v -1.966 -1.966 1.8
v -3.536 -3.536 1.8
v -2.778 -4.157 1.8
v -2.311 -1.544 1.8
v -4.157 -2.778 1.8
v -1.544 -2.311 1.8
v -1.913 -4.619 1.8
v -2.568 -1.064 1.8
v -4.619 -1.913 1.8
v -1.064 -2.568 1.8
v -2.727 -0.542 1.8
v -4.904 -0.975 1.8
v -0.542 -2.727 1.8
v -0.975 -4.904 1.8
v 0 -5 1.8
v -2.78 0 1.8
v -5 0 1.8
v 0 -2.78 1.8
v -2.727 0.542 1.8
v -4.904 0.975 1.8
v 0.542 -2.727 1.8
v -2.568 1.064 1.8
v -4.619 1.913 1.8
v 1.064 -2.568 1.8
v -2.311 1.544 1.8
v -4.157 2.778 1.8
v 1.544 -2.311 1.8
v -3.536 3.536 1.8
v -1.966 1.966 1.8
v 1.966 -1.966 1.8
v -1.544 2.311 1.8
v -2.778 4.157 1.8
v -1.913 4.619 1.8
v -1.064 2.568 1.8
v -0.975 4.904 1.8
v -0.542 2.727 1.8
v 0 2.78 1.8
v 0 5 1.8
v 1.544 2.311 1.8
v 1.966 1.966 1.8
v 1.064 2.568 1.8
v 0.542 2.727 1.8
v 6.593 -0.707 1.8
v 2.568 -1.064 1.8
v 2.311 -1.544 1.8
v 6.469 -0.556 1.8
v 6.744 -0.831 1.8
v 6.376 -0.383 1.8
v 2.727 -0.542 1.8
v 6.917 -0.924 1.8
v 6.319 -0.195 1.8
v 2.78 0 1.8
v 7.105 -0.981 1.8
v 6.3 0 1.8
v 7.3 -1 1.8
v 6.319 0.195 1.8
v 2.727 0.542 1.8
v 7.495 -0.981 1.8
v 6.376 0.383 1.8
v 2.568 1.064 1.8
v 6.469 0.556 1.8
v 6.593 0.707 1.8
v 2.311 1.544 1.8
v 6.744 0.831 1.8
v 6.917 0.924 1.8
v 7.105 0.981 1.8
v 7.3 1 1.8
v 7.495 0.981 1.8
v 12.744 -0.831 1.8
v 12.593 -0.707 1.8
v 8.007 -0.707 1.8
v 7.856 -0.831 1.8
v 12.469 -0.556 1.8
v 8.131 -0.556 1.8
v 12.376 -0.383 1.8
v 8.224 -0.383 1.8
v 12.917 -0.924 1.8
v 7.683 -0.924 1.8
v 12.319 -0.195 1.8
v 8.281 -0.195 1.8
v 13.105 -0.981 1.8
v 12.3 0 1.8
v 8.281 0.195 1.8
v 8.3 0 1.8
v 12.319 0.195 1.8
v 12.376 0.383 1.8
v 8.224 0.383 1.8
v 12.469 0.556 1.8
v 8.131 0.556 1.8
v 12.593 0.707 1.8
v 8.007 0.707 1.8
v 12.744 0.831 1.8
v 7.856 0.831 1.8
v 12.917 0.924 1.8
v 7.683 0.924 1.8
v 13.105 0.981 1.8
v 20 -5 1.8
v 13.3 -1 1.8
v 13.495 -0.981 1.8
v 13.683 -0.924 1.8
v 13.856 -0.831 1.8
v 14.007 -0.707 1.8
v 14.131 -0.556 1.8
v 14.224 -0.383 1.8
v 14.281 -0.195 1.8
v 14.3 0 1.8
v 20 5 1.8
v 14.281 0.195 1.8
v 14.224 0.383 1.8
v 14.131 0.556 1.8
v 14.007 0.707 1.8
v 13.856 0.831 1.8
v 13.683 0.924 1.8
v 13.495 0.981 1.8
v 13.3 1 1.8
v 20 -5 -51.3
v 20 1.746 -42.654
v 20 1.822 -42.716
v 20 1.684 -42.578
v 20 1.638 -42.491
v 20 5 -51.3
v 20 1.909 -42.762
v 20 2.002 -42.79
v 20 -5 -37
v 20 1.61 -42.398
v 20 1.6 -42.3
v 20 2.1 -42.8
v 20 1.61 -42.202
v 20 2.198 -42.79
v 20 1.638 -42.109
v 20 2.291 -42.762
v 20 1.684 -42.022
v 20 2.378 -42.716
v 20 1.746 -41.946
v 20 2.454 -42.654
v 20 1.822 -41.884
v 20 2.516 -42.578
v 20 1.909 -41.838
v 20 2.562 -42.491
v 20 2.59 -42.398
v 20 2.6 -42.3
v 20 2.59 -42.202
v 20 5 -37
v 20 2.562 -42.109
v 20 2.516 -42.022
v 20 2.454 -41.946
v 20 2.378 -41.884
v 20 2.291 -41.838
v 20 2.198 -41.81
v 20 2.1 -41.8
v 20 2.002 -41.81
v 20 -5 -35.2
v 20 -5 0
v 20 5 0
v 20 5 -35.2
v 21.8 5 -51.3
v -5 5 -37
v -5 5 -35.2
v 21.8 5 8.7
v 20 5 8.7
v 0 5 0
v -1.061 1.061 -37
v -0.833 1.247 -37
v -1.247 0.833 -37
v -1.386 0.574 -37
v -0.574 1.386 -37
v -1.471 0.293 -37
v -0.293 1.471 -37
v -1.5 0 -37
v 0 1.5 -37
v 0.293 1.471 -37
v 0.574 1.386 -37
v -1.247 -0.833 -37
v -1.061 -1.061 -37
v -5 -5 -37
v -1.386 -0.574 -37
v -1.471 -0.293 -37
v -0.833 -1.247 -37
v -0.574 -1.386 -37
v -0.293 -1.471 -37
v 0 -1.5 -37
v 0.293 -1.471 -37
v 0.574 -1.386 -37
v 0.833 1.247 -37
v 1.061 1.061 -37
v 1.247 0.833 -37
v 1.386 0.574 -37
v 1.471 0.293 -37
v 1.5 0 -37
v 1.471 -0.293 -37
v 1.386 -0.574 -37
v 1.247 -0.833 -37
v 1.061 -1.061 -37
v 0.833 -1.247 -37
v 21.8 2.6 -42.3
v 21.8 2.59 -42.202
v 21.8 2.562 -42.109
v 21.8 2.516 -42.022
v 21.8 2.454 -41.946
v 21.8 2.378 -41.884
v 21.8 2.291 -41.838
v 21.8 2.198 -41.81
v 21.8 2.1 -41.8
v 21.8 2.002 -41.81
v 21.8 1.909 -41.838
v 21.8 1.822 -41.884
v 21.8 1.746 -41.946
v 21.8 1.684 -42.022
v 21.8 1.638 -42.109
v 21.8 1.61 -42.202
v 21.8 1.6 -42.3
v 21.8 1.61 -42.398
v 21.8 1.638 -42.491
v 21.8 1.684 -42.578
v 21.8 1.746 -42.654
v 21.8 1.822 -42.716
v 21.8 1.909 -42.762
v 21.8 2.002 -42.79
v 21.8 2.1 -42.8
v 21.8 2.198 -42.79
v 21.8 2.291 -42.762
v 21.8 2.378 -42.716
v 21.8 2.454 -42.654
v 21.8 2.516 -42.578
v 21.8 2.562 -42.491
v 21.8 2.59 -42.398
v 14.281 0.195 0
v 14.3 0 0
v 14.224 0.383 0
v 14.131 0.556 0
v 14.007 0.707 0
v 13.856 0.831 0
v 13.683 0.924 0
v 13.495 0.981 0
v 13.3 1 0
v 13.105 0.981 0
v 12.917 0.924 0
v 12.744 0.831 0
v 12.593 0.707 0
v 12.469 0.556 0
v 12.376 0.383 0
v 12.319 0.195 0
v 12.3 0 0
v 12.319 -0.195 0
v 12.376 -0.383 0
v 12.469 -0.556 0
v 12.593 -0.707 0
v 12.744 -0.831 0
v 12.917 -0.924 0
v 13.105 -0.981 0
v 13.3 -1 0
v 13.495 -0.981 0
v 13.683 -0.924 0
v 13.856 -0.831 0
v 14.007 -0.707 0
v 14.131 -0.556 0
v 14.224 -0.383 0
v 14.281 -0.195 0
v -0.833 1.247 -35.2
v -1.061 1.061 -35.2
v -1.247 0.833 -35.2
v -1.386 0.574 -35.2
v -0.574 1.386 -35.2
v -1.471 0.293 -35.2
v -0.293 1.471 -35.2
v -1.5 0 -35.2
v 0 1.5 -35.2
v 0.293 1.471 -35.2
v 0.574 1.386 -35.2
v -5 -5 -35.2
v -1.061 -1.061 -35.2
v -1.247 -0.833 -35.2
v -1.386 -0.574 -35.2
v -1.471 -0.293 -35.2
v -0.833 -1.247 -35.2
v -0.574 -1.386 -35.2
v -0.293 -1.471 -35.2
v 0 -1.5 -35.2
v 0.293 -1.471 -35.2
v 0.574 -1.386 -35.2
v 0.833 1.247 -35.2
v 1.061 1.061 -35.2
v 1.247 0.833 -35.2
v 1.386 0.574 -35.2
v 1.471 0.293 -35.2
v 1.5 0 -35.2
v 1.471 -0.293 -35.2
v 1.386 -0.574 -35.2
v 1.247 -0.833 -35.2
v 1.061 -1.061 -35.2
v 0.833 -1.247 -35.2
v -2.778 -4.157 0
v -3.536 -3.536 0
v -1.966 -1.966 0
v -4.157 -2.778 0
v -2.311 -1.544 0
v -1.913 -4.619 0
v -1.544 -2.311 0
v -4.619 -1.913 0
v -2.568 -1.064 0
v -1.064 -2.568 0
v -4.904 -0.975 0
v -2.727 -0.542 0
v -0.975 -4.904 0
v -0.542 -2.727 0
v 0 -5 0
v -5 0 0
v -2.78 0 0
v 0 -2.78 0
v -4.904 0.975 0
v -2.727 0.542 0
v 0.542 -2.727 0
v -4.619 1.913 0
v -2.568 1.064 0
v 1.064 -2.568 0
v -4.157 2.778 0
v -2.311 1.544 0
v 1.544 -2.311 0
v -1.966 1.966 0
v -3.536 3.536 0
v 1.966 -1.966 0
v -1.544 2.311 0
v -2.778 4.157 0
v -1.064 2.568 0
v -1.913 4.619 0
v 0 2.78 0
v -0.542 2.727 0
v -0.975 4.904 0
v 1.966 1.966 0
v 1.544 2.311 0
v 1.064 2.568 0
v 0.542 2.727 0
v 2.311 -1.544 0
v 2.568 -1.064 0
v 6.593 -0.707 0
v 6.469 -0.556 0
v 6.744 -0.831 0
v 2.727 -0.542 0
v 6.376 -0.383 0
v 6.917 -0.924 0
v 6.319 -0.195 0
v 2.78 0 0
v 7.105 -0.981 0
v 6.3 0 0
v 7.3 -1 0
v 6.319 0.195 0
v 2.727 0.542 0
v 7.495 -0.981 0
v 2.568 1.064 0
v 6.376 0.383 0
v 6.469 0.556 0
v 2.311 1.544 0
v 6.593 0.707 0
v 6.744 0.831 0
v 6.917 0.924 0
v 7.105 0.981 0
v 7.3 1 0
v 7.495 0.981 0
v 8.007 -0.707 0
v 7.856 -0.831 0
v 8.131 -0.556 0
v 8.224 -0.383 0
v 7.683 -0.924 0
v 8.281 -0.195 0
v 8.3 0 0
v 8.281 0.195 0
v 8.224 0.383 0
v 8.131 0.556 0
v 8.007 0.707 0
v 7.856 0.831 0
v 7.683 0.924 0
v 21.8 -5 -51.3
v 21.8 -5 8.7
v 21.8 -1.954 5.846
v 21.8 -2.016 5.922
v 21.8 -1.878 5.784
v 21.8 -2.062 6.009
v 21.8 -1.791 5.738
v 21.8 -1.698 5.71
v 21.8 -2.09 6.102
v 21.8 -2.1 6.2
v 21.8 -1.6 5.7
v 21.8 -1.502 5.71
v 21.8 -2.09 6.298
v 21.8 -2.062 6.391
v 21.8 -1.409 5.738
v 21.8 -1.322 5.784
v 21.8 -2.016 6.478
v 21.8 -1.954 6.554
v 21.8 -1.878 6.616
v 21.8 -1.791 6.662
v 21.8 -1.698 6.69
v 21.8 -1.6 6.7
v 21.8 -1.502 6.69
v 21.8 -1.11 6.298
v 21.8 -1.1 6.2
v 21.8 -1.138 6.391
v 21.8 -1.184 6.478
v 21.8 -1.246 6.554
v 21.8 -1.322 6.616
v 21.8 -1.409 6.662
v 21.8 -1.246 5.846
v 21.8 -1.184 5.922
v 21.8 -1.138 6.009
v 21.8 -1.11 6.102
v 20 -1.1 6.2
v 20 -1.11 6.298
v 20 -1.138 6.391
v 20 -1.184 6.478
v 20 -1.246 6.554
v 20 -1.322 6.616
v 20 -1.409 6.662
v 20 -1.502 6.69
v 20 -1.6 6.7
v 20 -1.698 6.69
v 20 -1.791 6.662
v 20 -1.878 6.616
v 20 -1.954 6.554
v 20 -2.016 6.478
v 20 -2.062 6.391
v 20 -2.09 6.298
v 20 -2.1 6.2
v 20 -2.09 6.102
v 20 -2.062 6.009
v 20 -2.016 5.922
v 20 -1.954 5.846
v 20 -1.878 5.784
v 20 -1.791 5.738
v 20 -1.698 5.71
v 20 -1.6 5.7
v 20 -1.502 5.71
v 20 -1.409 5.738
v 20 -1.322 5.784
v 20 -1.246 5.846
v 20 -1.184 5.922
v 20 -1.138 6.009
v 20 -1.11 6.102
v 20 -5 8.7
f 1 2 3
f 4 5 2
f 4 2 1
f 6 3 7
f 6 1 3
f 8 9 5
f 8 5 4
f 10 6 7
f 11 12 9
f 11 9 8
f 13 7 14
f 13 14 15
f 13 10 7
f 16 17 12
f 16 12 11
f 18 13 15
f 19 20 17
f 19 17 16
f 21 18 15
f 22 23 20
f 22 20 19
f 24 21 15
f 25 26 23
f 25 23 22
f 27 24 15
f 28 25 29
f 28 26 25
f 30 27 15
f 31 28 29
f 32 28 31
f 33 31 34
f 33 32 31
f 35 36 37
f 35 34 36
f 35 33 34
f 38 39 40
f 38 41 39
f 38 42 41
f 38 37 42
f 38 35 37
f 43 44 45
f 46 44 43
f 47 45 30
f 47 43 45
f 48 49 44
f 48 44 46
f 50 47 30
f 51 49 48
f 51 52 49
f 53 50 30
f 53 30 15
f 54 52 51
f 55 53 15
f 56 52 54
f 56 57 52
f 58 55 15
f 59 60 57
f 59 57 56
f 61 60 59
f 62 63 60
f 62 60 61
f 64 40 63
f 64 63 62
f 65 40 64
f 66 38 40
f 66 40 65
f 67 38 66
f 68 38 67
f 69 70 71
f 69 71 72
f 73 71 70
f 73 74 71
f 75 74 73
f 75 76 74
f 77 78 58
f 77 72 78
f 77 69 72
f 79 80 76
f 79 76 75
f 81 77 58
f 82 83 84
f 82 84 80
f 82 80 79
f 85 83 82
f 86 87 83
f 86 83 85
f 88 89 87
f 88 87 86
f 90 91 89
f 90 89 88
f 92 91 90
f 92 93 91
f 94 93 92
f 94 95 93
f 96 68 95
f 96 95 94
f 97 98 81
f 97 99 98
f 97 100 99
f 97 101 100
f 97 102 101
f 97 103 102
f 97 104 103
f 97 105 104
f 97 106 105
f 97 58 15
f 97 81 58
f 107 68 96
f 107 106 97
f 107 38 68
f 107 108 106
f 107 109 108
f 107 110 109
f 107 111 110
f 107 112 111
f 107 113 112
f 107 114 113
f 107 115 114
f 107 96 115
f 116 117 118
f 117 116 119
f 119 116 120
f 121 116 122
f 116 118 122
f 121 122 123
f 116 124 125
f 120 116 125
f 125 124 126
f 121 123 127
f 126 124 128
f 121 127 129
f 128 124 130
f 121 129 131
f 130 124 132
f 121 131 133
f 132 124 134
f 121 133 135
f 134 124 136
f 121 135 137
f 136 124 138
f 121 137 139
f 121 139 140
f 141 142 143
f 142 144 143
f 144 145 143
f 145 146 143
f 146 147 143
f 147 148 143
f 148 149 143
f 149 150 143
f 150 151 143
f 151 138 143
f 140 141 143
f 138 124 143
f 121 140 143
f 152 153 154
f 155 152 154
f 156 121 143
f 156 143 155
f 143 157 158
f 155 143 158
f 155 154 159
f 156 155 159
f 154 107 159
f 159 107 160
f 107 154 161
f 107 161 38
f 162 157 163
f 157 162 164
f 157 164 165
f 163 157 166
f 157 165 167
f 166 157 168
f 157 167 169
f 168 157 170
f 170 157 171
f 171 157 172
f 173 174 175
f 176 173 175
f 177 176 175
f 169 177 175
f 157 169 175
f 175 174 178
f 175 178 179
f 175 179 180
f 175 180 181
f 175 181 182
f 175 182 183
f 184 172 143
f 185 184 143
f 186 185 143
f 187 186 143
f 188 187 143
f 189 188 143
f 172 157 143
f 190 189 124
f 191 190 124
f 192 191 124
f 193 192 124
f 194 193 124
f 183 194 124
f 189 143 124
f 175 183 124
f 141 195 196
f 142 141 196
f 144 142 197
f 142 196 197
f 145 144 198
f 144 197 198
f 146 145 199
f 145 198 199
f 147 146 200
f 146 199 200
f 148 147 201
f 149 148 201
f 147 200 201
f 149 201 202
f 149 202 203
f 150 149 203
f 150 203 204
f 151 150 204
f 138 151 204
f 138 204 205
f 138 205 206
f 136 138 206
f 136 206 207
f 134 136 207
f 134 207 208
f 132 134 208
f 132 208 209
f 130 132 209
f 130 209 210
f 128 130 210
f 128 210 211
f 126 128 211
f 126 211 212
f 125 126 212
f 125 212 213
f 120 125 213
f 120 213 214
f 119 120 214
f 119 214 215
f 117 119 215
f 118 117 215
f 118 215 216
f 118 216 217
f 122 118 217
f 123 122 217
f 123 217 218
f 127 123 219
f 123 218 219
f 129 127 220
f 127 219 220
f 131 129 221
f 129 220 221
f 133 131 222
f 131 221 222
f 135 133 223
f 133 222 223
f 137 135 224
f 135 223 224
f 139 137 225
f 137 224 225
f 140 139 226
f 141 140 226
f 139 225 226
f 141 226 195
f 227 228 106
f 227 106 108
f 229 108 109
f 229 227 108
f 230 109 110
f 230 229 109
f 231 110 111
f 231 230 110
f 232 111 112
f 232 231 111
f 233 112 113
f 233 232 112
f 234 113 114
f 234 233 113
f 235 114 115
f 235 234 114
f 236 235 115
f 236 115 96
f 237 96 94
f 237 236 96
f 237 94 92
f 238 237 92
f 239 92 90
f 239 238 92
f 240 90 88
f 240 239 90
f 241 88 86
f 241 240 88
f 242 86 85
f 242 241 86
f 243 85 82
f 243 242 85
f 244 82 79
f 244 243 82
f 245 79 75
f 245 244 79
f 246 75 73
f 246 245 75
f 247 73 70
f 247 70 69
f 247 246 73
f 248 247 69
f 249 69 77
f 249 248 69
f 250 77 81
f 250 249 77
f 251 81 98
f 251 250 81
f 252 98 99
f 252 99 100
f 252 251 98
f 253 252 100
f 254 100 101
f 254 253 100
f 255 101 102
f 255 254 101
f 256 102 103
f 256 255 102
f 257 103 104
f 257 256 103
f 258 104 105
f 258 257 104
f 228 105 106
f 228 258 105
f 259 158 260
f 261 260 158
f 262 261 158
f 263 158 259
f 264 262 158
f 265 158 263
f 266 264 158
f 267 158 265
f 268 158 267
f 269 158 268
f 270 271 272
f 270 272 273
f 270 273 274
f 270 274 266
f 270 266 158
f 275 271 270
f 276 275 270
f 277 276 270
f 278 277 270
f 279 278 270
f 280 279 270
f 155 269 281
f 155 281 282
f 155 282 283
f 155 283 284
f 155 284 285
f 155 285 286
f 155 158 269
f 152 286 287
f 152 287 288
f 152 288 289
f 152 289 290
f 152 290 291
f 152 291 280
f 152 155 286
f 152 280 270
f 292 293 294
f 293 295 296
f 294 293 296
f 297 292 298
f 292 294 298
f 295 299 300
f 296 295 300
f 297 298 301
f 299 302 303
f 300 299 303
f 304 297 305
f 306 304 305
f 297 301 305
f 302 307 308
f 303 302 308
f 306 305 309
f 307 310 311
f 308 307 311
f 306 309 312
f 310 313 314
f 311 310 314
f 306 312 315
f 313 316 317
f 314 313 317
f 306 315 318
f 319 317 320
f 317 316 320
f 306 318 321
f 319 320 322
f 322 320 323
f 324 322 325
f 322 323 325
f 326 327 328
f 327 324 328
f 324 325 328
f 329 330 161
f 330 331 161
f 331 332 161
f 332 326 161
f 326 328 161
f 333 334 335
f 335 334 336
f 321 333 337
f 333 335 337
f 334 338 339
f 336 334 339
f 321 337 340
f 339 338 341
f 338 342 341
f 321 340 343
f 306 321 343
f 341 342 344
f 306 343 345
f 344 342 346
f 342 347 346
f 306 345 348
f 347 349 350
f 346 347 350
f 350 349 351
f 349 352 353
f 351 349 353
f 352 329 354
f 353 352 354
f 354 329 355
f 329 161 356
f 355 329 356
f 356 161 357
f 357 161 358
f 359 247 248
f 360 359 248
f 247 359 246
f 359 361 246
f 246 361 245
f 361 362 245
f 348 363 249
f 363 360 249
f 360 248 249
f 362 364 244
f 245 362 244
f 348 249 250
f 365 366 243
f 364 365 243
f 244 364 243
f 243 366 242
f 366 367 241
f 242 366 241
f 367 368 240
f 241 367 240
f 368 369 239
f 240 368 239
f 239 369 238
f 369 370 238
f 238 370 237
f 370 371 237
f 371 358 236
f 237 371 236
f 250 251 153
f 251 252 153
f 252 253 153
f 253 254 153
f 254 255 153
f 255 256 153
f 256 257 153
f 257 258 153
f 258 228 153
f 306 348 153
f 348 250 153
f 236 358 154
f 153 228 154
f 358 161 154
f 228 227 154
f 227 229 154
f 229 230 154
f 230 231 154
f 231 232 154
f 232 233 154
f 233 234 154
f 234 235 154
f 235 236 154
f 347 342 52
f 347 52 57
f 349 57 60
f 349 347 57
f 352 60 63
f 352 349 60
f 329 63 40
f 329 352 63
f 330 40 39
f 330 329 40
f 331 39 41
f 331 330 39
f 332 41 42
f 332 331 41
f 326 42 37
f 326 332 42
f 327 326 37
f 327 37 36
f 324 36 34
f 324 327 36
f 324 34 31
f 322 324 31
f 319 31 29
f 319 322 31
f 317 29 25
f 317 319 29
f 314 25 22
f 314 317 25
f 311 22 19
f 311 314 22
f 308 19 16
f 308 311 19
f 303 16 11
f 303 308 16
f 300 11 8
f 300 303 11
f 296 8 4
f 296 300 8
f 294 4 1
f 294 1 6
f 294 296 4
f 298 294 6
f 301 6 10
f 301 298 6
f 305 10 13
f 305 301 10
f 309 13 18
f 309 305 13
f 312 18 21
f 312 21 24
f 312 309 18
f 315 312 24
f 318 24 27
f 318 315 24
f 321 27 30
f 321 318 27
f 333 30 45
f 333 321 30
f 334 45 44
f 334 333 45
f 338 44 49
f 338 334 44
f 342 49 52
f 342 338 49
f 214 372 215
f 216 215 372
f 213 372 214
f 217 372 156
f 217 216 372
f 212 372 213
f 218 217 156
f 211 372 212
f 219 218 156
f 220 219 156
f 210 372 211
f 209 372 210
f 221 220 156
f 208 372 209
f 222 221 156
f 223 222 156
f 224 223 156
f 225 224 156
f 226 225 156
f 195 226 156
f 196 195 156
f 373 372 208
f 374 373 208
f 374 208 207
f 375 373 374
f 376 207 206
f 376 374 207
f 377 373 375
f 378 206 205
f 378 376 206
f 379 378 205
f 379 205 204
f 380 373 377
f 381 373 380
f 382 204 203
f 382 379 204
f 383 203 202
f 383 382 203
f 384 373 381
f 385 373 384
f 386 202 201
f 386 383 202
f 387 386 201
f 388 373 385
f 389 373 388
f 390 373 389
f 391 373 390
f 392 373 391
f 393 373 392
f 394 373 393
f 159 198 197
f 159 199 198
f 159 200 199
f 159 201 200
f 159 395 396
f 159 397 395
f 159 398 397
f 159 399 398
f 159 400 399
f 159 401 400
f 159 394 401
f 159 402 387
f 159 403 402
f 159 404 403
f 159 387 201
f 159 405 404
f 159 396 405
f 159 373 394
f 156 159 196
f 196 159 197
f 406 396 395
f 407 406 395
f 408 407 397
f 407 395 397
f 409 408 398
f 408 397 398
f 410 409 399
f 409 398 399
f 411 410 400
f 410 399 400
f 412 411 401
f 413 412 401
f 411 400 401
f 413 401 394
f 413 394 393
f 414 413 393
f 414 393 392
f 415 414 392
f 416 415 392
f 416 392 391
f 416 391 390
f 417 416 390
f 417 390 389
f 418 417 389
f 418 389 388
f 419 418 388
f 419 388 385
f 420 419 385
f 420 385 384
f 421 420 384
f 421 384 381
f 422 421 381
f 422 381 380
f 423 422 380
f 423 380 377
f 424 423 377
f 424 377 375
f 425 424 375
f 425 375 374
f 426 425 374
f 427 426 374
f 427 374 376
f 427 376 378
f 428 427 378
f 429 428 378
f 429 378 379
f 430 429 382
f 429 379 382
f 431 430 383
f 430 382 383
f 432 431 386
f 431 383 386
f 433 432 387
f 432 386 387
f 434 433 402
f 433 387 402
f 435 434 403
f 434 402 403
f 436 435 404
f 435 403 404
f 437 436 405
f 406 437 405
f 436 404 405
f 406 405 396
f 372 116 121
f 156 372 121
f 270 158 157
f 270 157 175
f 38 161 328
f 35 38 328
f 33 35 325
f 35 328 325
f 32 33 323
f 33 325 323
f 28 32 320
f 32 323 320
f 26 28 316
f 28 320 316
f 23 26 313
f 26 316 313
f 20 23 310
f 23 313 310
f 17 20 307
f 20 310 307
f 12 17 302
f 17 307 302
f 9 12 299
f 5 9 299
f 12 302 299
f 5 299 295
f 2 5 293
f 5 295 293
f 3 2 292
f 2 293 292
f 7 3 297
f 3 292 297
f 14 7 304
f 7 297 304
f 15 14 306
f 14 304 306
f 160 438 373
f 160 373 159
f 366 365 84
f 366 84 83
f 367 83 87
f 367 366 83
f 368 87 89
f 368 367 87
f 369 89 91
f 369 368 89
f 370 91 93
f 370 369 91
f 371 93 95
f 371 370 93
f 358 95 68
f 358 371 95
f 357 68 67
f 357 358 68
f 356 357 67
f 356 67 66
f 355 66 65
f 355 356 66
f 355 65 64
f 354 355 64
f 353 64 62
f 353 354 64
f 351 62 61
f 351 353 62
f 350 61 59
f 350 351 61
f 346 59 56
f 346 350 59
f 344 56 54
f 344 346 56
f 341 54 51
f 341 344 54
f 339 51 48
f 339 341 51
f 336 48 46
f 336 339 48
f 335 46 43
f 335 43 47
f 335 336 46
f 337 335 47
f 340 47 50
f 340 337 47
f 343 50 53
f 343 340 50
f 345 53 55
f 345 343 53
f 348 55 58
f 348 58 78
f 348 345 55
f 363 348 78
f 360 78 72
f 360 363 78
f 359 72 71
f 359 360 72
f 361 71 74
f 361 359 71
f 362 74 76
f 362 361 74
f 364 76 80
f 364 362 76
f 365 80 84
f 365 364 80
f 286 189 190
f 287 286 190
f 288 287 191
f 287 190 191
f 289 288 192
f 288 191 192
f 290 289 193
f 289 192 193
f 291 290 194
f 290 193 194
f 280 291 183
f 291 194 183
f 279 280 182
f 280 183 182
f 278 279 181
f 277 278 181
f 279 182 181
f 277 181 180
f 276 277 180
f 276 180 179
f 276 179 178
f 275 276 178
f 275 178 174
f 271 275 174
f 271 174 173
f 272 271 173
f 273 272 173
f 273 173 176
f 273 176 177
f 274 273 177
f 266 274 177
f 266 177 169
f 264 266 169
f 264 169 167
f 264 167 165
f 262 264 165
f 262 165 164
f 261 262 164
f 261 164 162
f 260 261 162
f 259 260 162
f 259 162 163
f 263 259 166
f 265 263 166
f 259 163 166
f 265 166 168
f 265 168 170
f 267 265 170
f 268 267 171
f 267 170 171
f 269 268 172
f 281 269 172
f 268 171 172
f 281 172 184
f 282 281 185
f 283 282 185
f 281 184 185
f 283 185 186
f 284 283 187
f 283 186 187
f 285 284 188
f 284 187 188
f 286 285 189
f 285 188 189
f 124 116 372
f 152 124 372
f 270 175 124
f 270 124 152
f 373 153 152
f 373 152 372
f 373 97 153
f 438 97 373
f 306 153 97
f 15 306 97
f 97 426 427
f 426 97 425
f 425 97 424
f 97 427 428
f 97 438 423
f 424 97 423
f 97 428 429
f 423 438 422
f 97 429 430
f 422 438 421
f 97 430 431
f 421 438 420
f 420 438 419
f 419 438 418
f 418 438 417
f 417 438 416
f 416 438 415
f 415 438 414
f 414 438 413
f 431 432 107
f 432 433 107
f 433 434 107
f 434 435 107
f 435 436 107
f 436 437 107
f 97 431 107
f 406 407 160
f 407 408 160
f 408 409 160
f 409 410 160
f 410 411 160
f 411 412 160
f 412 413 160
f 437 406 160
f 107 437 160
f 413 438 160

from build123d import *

# Parameters (mm, degrees)
SKETCH_R        = 2.78
SKETCH_R_2      = 1
PAD_DEPTH       = 1.8
SKETCH001_W     = 10
SKETCH001_H     = 60
PAD001_DEPTH    = 1.8
SKETCH002_W     = 10
SKETCH002_H     = 1.8
PAD002_DEPTH    = 25
SKETCH003_R     = 1.5
POCKET_DEPTH    = 45.701
SKETCH004_R     = 0.5
POCKET001_DEPTH = 26.801


with BuildPart() as part:
    # Sketch → Pad (new body)
    with BuildSketch(Plane.XY):
        with BuildLine():
            ThreePointArc((0, 5), (-5, 0), (0, -5))
            Line((0, -5), (20, -5))
            Line((20, 5), (20, -5))
            Line((0, 5), (20, 5))
        make_face()
        Circle(SKETCH_R, mode=Mode.SUBTRACT)
        with Locations((7.3, 0)):
            Circle(SKETCH_R_2, mode=Mode.SUBTRACT)
        with Locations((13.3, 0)):
            Circle(SKETCH_R_2, mode=Mode.SUBTRACT)
    extrude(amount=PAD_DEPTH)

    # Sketch001 → Pad001 (new body)
    with BuildSketch(Plane.YZ.offset(20)):
        with Locations((0, -21.3)):
            Rectangle(SKETCH001_W, SKETCH001_H)
    extrude(amount=PAD001_DEPTH)

    # Sketch002 → Pad002 (new body)
    with BuildSketch(Plane(origin=(20, 0, 0), x_dir=(0, -1, 0), z_dir=(-1, 0, 0))):
        with Locations((0, -36.1)):
            Rectangle(SKETCH002_W, SKETCH002_H)
    extrude(amount=PAD002_DEPTH)

    # Sketch003 → Pocket (cut, through all)
    with BuildSketch(Plane(origin=(0, 0, -37), x_dir=(1, 0, 0), z_dir=(0, 0, -1))):
        Circle(SKETCH003_R)
    extrude(amount=-POCKET_DEPTH, mode=Mode.SUBTRACT)

    # Sketch004 → Pocket001 (cut, through all)
    with BuildSketch(Plane.YZ.offset(21.8)):
        with Locations((2.1, -42.3)):
            Circle(SKETCH004_R)
        with Locations((-1.6, 6.2)):
            Circle(SKETCH004_R)
    extrude(amount=-POCKET001_DEPTH, mode=Mode.SUBTRACT)


solid = part.part
